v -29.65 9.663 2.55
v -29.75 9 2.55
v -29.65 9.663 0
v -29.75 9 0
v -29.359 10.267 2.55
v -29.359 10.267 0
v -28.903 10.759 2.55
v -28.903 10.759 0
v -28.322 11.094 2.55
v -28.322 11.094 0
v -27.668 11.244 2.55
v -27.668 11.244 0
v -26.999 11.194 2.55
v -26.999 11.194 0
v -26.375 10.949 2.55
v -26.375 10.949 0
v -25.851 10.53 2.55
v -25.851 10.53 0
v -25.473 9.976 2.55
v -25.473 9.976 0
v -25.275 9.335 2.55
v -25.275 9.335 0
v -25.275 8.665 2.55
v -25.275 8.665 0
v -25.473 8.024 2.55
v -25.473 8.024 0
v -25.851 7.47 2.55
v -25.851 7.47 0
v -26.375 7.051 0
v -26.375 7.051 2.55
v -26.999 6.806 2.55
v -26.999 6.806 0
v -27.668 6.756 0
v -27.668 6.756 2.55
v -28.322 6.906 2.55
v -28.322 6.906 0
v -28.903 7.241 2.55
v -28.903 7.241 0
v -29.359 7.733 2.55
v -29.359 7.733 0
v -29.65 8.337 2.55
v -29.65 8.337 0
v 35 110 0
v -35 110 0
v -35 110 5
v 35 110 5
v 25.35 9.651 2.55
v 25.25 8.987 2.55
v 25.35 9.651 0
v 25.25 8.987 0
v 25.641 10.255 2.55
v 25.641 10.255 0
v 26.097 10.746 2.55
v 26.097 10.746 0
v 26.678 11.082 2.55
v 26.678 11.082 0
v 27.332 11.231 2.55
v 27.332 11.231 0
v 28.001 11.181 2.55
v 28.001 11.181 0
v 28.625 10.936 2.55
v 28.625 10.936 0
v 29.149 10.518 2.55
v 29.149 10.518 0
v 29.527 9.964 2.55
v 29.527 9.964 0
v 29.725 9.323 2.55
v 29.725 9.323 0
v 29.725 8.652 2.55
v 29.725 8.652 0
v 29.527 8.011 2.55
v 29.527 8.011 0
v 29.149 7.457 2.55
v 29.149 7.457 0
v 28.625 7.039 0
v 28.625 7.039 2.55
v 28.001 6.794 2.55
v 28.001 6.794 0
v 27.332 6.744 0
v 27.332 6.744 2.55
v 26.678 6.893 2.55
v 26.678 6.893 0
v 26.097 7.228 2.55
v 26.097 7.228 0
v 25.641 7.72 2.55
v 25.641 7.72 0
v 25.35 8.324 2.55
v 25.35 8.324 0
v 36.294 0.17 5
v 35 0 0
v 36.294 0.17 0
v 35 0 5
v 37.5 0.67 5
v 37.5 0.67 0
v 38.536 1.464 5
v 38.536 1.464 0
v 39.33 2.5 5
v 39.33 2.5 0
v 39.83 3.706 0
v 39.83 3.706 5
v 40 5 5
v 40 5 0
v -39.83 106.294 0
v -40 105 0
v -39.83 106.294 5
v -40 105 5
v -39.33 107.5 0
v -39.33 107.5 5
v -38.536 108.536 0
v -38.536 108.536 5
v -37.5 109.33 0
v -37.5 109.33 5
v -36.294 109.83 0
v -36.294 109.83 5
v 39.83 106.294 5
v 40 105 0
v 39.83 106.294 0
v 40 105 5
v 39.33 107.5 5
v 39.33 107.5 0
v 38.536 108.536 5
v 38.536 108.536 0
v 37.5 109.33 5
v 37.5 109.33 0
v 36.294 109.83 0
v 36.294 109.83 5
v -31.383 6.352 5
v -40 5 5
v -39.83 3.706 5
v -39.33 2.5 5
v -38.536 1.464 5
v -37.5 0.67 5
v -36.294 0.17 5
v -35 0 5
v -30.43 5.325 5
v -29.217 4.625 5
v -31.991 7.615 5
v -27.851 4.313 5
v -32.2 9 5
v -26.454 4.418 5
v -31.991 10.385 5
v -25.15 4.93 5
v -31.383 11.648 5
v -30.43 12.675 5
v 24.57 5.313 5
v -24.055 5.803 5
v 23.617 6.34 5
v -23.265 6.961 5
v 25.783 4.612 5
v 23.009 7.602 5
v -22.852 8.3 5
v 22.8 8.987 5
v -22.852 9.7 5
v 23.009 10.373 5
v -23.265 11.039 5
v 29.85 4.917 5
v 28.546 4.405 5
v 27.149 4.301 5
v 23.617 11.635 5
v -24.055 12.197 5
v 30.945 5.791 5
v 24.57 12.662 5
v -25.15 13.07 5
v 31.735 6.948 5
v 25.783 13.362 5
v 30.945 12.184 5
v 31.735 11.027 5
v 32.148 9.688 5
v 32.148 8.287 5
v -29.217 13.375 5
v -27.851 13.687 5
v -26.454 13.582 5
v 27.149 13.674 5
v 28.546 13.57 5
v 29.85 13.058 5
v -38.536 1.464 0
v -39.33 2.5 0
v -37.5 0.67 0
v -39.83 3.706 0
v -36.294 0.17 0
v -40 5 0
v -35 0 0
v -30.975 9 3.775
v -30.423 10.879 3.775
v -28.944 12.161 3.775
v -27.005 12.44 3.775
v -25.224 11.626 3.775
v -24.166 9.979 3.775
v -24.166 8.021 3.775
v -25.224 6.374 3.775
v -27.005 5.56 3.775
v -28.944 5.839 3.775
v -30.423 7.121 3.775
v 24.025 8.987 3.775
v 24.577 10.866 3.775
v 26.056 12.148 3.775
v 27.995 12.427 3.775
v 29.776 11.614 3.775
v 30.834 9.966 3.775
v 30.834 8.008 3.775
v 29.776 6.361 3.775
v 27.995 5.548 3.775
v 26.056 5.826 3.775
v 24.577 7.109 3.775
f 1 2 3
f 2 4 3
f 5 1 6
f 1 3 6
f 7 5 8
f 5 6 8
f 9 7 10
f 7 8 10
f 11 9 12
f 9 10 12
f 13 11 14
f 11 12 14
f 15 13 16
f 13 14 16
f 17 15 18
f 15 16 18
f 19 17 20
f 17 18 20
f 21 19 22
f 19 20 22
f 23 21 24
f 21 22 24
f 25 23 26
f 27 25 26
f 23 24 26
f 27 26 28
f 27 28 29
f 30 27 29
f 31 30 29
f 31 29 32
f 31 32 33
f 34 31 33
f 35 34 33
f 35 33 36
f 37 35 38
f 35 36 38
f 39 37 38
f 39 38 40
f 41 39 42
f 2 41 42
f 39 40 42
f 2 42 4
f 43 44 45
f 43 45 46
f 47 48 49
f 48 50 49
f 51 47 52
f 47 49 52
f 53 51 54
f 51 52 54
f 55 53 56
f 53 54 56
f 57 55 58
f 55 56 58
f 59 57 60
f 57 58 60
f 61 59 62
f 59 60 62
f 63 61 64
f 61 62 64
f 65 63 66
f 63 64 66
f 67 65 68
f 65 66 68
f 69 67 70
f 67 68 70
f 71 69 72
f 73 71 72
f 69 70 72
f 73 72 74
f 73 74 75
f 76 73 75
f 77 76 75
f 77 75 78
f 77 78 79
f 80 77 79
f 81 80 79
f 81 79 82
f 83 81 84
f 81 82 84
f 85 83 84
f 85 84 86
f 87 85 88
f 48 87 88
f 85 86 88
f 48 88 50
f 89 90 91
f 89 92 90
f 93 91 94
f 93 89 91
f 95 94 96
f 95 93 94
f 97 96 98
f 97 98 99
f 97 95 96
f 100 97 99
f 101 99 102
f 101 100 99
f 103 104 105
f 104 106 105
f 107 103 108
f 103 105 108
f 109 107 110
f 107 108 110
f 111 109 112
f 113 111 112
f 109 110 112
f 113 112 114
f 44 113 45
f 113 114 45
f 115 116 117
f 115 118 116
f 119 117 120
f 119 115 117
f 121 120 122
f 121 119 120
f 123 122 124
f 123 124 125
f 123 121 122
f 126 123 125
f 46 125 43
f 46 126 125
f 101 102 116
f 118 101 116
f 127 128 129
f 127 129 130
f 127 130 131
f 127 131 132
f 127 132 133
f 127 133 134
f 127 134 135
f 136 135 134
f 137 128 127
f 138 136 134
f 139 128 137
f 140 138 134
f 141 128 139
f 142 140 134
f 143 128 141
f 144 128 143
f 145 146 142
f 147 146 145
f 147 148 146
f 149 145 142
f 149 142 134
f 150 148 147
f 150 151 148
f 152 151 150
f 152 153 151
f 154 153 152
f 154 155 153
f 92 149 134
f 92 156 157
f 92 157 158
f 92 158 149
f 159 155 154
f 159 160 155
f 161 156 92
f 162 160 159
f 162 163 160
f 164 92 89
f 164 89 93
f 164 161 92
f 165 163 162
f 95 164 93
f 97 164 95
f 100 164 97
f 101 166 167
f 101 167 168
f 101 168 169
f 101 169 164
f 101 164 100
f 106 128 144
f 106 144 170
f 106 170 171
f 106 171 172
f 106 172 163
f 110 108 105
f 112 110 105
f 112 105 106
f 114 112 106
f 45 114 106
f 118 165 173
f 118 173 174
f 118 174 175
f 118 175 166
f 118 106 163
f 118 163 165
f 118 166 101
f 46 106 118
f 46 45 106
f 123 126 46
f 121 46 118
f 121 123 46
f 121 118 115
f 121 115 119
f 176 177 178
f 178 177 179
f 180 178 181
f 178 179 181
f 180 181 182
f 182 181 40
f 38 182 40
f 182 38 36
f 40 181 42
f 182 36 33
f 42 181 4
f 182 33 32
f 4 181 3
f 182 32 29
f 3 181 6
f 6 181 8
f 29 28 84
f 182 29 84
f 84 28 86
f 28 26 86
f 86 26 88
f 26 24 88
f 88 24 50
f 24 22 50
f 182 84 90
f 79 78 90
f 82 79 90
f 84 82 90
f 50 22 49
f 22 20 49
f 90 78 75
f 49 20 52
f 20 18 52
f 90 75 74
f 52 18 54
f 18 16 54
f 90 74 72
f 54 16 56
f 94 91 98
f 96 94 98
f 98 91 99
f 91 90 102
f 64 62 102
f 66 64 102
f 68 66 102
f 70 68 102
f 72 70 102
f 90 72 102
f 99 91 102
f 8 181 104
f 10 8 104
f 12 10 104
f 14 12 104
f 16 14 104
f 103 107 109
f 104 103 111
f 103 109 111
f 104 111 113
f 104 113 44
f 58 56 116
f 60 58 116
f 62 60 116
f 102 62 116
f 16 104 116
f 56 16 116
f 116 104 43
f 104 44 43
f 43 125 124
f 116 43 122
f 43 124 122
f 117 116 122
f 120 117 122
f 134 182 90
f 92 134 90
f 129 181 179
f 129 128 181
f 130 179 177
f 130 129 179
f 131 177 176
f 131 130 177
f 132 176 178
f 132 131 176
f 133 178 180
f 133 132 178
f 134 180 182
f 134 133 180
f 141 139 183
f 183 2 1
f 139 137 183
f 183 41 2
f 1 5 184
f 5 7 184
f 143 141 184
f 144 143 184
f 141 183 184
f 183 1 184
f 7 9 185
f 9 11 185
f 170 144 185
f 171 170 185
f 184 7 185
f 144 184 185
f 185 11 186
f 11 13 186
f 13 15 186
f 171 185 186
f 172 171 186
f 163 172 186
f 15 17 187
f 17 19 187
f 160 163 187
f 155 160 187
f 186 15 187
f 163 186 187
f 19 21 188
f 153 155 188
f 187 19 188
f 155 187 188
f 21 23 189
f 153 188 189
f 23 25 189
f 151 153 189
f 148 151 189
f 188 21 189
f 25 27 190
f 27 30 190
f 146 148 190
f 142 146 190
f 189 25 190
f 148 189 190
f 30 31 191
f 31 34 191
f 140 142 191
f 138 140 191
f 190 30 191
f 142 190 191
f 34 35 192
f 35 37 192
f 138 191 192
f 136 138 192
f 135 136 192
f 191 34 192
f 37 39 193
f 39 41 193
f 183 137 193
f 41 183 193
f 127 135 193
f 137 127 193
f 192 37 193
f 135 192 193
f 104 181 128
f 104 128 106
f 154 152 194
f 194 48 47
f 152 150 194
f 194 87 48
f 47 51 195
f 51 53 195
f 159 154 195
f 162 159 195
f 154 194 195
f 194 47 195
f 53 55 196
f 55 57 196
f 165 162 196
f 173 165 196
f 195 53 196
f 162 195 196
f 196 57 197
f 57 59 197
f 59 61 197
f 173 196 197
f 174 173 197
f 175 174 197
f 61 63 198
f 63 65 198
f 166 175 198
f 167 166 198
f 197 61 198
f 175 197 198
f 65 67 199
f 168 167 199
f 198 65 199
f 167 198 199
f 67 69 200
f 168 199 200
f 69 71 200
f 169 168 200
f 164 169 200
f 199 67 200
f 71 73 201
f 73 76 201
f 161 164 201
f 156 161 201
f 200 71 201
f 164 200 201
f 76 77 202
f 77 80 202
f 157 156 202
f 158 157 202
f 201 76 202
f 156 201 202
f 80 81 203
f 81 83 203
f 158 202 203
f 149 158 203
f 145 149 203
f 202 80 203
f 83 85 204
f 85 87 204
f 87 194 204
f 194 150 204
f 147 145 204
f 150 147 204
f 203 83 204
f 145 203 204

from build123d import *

# Parameters (mm, degrees)
SKETCH1_W                                           = 80
SKETCH1_H                                           = 110
BOSS_EXTRUDE1_DEPTH                                 = 5
FILLET1_R                                           = 5
CSK_FOR_M4_COUNTERSUNK_FLAT_HEAD_SCREW1_D           = 4.5
CSK_FOR_M4_COUNTERSUNK_FLAT_HEAD_SCREW1_DEPTH       = 10
CSK_FOR_M4_COUNTERSUNK_FLAT_HEAD_SCREW1_CSINK_D     = 9.4
CSK_FOR_M4_COUNTERSUNK_FLAT_HEAD_SCREW1_CSINK_ANGLE = 90
CSK_FOR_M4_COUNTERSUNK_FLAT_HEAD_SCREW1_TIP         = 1.351936393


with BuildPart() as part:
    # Sketch1 → Boss-Extrude1 (new body)
    with BuildSketch(Plane.XY):
        with Locations((0, 55)):
            Rectangle(SKETCH1_W, SKETCH1_H)
    extrude(amount=BOSS_EXTRUDE1_DEPTH)

    # Fillet1
    fillet1_edges = [part.edges().sort_by_distance(p)[0] for p in [
        (-40, 110, 2.5),
        (40, 110, 2.5),
        (40, 0, 2.5),
        (-40, 0, 2.5),
    ]]
    fillet(fillet1_edges, radius=FILLET1_R)

    # CSK for M4 Countersunk Flat Head Screw1
    with Locations(Plane.XY.offset(5)):
        with Locations((-27.5, 9), (27.5, 8.987365755)):
            CounterSinkHole(CSK_FOR_M4_COUNTERSUNK_FLAT_HEAD_SCREW1_D / 2, CSK_FOR_M4_COUNTERSUNK_FLAT_HEAD_SCREW1_CSINK_D / 2, depth=CSK_FOR_M4_COUNTERSUNK_FLAT_HEAD_SCREW1_DEPTH, counter_sink_angle=CSK_FOR_M4_COUNTERSUNK_FLAT_HEAD_SCREW1_CSINK_ANGLE)
            with Locations((0, 0, -(CSK_FOR_M4_COUNTERSUNK_FLAT_HEAD_SCREW1_DEPTH + CSK_FOR_M4_COUNTERSUNK_FLAT_HEAD_SCREW1_TIP / 2))):  # 118° drill point
                Cone(0, CSK_FOR_M4_COUNTERSUNK_FLAT_HEAD_SCREW1_D / 2, CSK_FOR_M4_COUNTERSUNK_FLAT_HEAD_SCREW1_TIP, mode=Mode.SUBTRACT)


solid = part.part
